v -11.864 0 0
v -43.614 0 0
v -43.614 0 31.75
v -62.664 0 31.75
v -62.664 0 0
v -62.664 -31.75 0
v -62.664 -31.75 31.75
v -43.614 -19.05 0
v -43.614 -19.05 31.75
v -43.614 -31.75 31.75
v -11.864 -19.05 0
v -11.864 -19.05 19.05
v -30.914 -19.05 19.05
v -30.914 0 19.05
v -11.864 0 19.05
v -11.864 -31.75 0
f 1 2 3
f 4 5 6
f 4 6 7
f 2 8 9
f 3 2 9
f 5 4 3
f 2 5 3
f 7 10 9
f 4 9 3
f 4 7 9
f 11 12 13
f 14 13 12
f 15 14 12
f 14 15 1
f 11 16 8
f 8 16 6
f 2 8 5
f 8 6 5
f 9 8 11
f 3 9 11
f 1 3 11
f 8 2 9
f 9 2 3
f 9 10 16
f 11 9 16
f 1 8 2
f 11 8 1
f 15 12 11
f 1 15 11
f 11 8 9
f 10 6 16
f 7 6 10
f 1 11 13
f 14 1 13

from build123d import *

# Parameters (mm, degrees)
F0_W     = 19.05
F0_H     = 31.75
F1_DEPTH = 31.75
F2_W     = 12.7
F2_H     = 31.75
F3_DEPTH = 31.75
F5_DEPTH = 25.4
F7_DEPTH = 19.05
F8_DEPTH = 19.05


with BuildPart() as f1:
    # F0 (on Front) → F1 (new body)
    with BuildSketch(Plane.XZ):
        with Locations((-53.1394695162, 15.875)):
            Rectangle(F0_W, F0_H)
    extrude(amount=F1_DEPTH)

    # F2 (on face) → F3 (join)
    with BuildSketch(Plane.YZ.offset(-43.6144695162)):
        with Locations((-25.4, 15.875)):
            Rectangle(F2_W, F2_H)
    extrude(amount=F3_DEPTH)

    # F4 (on face) → F5 (cut)
    with BuildSketch(Plane.XZ.offset(31.75)):
        Polygon((-43.6144695162, 31.75), (-11.8644695162, 0), (-11.8644695162, 31.75), align=None)
    extrude(amount=-F5_DEPTH, mode=Mode.SUBTRACT)


with BuildPart() as f7:
    # F6 (on face) → F7 (new body)
    with BuildSketch(Plane(origin=(0, -19.05, 0), x_dir=(-1, 0, 0), z_dir=(0, 1, 0))):
        Polygon((11.8644695162, 19.05), (11.8644695162, 0), (30.9144695162, 19.05), align=None)
    extrude(amount=F7_DEPTH)


with BuildPart() as f8:
    # F8 (new): a face of the model
    f8_faces = [f1.part.faces().sort_by_distance(p)[0] for p in [
        (-33.0311361829, -19.05, 10.5833333333),
    ]]
    extrude(f8_faces, amount=F8_DEPTH)


solid = Compound([f1.part, f7.part, f8.part])
